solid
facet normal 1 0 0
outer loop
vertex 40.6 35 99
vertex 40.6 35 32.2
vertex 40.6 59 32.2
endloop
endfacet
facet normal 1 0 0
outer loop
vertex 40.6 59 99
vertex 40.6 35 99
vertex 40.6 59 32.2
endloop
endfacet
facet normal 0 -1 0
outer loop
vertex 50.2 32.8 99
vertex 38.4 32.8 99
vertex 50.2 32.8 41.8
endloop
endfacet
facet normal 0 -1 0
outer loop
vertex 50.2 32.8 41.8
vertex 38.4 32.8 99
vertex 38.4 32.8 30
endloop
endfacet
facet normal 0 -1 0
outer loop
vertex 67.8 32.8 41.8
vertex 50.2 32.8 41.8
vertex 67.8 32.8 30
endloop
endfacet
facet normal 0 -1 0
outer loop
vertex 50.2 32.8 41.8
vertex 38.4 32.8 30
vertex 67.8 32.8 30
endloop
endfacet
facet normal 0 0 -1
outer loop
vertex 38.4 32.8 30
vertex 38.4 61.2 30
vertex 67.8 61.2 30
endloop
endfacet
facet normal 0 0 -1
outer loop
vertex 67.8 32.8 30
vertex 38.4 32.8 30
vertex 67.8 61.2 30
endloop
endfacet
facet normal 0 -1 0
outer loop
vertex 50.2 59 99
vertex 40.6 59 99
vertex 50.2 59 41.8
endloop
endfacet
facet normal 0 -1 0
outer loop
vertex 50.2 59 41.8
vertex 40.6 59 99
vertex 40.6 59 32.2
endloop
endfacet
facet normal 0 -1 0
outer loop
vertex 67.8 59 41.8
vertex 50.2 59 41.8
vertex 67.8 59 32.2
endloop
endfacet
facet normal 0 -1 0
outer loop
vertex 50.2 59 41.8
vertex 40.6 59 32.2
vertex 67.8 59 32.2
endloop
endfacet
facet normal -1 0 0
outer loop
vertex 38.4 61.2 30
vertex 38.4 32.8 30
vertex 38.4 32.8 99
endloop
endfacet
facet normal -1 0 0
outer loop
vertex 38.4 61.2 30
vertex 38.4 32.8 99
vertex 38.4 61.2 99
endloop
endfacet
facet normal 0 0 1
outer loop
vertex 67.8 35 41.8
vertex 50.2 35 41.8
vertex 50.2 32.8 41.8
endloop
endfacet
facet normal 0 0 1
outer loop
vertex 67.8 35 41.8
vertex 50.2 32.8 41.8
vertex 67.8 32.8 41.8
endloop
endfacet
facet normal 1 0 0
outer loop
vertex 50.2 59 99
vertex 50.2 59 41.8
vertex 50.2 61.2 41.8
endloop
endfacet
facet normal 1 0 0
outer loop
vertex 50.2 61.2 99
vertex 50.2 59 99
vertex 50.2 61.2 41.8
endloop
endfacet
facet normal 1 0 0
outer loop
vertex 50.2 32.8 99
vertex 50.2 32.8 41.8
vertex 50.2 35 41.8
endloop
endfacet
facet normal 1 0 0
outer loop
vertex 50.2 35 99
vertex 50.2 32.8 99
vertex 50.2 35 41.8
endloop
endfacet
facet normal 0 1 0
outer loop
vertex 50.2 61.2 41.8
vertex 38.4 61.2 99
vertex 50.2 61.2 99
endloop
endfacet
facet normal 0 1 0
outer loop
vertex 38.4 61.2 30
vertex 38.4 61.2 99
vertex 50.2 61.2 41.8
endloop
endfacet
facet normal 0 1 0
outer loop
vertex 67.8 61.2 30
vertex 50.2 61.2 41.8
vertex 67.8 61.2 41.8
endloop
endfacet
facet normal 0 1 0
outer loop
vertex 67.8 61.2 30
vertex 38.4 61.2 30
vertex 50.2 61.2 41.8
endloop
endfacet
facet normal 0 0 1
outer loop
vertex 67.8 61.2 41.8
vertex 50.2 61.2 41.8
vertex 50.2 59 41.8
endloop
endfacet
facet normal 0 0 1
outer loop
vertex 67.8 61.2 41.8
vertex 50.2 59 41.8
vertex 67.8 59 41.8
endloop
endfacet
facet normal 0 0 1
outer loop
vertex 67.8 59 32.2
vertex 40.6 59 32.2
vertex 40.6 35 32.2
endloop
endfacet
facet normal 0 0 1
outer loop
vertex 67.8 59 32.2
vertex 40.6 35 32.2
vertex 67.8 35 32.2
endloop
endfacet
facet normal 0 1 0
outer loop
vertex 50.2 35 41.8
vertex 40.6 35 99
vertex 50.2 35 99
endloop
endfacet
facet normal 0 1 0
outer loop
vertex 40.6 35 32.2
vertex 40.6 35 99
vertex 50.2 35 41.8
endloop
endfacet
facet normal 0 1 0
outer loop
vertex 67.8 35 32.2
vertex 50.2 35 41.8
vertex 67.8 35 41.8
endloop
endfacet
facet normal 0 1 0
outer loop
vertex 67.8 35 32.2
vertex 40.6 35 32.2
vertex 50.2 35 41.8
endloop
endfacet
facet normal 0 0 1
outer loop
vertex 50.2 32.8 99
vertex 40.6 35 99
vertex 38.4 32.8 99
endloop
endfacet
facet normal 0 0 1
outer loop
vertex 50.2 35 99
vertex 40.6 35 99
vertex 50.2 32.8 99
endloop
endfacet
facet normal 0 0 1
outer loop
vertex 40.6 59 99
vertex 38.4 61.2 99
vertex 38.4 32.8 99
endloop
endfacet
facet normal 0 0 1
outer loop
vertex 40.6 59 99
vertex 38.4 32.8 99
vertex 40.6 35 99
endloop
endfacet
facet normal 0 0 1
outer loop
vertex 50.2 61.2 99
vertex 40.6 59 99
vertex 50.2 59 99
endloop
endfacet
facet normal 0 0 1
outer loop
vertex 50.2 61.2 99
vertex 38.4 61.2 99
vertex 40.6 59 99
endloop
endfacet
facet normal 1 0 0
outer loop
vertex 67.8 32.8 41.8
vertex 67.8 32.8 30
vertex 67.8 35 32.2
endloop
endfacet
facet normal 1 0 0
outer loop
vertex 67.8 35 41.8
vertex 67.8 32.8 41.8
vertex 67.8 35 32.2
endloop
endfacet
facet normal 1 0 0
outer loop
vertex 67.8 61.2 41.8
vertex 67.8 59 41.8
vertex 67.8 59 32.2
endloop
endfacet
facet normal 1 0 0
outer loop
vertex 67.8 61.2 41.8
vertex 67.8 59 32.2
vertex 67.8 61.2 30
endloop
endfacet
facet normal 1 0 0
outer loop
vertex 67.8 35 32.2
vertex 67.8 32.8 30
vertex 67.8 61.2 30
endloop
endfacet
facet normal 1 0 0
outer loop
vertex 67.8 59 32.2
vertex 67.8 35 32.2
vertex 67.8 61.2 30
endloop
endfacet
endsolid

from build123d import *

# Parameters (mm, degrees)
BOX027_W     = 9.6
BOX027_H     = 24
BOX027_DEPTH = 66.8
BOX024_W     = 11.8
BOX024_H     = 28.4
BOX024_DEPTH = 69
BOX026_W     = 17.6
BOX026_H     = 24
BOX026_DEPTH = 9.6
BOX025_W     = 17.6
BOX025_H     = 28.4
BOX025_DEPTH = 11.8


with BuildPart() as cube020:
    # Box027 → Box027 (new body)
    with BuildSketch(Plane(origin=(-9.6, 2.2, 2.2), x_dir=(1, 0, 0), z_dir=(0, 0, 1))):
        with Locations((4.8, 12)):
            Rectangle(BOX027_W, BOX027_H)
    extrude(amount=BOX027_DEPTH)


with BuildPart() as cut024:
    # Box024 → Box024 (new body)
    with BuildSketch(Plane(origin=(-11.8, 0, 0), x_dir=(1, 0, 0), z_dir=(0, 0, 1))):
        with Locations((5.9, 14.2)):
            Rectangle(BOX024_W, BOX024_H)
    extrude(amount=BOX024_DEPTH)

    # Cut024: cut Cube020
    add(cube020.part, mode=Mode.SUBTRACT)


with BuildPart() as cube019:
    # Box026 → Box026 (new body)
    with BuildSketch(Plane(origin=(0, 2.2, 2.2), x_dir=(1, 0, 0), z_dir=(0, 0, 1))):
        with Locations((8.8, 12)):
            Rectangle(BOX026_W, BOX026_H)
    extrude(amount=BOX026_DEPTH)


with BuildPart() as rohr:
    # Box025 → Box025 (new body)
    with BuildSketch(Plane.XY):
        with Locations((8.8, 14.2)):
            Rectangle(BOX025_W, BOX025_H)
    extrude(amount=BOX025_DEPTH)

    # Cut023: cut Cube019
    add(cube019.part, mode=Mode.SUBTRACT)

    # Fusion010: union Cut024
    add(cut024.part)


with BuildPart() as rohr_1:
    # Fusion010 placement: moved
    add(rohr.part.moved(Location((50.2, 32.8, 30))))


solid = rohr_1.part
